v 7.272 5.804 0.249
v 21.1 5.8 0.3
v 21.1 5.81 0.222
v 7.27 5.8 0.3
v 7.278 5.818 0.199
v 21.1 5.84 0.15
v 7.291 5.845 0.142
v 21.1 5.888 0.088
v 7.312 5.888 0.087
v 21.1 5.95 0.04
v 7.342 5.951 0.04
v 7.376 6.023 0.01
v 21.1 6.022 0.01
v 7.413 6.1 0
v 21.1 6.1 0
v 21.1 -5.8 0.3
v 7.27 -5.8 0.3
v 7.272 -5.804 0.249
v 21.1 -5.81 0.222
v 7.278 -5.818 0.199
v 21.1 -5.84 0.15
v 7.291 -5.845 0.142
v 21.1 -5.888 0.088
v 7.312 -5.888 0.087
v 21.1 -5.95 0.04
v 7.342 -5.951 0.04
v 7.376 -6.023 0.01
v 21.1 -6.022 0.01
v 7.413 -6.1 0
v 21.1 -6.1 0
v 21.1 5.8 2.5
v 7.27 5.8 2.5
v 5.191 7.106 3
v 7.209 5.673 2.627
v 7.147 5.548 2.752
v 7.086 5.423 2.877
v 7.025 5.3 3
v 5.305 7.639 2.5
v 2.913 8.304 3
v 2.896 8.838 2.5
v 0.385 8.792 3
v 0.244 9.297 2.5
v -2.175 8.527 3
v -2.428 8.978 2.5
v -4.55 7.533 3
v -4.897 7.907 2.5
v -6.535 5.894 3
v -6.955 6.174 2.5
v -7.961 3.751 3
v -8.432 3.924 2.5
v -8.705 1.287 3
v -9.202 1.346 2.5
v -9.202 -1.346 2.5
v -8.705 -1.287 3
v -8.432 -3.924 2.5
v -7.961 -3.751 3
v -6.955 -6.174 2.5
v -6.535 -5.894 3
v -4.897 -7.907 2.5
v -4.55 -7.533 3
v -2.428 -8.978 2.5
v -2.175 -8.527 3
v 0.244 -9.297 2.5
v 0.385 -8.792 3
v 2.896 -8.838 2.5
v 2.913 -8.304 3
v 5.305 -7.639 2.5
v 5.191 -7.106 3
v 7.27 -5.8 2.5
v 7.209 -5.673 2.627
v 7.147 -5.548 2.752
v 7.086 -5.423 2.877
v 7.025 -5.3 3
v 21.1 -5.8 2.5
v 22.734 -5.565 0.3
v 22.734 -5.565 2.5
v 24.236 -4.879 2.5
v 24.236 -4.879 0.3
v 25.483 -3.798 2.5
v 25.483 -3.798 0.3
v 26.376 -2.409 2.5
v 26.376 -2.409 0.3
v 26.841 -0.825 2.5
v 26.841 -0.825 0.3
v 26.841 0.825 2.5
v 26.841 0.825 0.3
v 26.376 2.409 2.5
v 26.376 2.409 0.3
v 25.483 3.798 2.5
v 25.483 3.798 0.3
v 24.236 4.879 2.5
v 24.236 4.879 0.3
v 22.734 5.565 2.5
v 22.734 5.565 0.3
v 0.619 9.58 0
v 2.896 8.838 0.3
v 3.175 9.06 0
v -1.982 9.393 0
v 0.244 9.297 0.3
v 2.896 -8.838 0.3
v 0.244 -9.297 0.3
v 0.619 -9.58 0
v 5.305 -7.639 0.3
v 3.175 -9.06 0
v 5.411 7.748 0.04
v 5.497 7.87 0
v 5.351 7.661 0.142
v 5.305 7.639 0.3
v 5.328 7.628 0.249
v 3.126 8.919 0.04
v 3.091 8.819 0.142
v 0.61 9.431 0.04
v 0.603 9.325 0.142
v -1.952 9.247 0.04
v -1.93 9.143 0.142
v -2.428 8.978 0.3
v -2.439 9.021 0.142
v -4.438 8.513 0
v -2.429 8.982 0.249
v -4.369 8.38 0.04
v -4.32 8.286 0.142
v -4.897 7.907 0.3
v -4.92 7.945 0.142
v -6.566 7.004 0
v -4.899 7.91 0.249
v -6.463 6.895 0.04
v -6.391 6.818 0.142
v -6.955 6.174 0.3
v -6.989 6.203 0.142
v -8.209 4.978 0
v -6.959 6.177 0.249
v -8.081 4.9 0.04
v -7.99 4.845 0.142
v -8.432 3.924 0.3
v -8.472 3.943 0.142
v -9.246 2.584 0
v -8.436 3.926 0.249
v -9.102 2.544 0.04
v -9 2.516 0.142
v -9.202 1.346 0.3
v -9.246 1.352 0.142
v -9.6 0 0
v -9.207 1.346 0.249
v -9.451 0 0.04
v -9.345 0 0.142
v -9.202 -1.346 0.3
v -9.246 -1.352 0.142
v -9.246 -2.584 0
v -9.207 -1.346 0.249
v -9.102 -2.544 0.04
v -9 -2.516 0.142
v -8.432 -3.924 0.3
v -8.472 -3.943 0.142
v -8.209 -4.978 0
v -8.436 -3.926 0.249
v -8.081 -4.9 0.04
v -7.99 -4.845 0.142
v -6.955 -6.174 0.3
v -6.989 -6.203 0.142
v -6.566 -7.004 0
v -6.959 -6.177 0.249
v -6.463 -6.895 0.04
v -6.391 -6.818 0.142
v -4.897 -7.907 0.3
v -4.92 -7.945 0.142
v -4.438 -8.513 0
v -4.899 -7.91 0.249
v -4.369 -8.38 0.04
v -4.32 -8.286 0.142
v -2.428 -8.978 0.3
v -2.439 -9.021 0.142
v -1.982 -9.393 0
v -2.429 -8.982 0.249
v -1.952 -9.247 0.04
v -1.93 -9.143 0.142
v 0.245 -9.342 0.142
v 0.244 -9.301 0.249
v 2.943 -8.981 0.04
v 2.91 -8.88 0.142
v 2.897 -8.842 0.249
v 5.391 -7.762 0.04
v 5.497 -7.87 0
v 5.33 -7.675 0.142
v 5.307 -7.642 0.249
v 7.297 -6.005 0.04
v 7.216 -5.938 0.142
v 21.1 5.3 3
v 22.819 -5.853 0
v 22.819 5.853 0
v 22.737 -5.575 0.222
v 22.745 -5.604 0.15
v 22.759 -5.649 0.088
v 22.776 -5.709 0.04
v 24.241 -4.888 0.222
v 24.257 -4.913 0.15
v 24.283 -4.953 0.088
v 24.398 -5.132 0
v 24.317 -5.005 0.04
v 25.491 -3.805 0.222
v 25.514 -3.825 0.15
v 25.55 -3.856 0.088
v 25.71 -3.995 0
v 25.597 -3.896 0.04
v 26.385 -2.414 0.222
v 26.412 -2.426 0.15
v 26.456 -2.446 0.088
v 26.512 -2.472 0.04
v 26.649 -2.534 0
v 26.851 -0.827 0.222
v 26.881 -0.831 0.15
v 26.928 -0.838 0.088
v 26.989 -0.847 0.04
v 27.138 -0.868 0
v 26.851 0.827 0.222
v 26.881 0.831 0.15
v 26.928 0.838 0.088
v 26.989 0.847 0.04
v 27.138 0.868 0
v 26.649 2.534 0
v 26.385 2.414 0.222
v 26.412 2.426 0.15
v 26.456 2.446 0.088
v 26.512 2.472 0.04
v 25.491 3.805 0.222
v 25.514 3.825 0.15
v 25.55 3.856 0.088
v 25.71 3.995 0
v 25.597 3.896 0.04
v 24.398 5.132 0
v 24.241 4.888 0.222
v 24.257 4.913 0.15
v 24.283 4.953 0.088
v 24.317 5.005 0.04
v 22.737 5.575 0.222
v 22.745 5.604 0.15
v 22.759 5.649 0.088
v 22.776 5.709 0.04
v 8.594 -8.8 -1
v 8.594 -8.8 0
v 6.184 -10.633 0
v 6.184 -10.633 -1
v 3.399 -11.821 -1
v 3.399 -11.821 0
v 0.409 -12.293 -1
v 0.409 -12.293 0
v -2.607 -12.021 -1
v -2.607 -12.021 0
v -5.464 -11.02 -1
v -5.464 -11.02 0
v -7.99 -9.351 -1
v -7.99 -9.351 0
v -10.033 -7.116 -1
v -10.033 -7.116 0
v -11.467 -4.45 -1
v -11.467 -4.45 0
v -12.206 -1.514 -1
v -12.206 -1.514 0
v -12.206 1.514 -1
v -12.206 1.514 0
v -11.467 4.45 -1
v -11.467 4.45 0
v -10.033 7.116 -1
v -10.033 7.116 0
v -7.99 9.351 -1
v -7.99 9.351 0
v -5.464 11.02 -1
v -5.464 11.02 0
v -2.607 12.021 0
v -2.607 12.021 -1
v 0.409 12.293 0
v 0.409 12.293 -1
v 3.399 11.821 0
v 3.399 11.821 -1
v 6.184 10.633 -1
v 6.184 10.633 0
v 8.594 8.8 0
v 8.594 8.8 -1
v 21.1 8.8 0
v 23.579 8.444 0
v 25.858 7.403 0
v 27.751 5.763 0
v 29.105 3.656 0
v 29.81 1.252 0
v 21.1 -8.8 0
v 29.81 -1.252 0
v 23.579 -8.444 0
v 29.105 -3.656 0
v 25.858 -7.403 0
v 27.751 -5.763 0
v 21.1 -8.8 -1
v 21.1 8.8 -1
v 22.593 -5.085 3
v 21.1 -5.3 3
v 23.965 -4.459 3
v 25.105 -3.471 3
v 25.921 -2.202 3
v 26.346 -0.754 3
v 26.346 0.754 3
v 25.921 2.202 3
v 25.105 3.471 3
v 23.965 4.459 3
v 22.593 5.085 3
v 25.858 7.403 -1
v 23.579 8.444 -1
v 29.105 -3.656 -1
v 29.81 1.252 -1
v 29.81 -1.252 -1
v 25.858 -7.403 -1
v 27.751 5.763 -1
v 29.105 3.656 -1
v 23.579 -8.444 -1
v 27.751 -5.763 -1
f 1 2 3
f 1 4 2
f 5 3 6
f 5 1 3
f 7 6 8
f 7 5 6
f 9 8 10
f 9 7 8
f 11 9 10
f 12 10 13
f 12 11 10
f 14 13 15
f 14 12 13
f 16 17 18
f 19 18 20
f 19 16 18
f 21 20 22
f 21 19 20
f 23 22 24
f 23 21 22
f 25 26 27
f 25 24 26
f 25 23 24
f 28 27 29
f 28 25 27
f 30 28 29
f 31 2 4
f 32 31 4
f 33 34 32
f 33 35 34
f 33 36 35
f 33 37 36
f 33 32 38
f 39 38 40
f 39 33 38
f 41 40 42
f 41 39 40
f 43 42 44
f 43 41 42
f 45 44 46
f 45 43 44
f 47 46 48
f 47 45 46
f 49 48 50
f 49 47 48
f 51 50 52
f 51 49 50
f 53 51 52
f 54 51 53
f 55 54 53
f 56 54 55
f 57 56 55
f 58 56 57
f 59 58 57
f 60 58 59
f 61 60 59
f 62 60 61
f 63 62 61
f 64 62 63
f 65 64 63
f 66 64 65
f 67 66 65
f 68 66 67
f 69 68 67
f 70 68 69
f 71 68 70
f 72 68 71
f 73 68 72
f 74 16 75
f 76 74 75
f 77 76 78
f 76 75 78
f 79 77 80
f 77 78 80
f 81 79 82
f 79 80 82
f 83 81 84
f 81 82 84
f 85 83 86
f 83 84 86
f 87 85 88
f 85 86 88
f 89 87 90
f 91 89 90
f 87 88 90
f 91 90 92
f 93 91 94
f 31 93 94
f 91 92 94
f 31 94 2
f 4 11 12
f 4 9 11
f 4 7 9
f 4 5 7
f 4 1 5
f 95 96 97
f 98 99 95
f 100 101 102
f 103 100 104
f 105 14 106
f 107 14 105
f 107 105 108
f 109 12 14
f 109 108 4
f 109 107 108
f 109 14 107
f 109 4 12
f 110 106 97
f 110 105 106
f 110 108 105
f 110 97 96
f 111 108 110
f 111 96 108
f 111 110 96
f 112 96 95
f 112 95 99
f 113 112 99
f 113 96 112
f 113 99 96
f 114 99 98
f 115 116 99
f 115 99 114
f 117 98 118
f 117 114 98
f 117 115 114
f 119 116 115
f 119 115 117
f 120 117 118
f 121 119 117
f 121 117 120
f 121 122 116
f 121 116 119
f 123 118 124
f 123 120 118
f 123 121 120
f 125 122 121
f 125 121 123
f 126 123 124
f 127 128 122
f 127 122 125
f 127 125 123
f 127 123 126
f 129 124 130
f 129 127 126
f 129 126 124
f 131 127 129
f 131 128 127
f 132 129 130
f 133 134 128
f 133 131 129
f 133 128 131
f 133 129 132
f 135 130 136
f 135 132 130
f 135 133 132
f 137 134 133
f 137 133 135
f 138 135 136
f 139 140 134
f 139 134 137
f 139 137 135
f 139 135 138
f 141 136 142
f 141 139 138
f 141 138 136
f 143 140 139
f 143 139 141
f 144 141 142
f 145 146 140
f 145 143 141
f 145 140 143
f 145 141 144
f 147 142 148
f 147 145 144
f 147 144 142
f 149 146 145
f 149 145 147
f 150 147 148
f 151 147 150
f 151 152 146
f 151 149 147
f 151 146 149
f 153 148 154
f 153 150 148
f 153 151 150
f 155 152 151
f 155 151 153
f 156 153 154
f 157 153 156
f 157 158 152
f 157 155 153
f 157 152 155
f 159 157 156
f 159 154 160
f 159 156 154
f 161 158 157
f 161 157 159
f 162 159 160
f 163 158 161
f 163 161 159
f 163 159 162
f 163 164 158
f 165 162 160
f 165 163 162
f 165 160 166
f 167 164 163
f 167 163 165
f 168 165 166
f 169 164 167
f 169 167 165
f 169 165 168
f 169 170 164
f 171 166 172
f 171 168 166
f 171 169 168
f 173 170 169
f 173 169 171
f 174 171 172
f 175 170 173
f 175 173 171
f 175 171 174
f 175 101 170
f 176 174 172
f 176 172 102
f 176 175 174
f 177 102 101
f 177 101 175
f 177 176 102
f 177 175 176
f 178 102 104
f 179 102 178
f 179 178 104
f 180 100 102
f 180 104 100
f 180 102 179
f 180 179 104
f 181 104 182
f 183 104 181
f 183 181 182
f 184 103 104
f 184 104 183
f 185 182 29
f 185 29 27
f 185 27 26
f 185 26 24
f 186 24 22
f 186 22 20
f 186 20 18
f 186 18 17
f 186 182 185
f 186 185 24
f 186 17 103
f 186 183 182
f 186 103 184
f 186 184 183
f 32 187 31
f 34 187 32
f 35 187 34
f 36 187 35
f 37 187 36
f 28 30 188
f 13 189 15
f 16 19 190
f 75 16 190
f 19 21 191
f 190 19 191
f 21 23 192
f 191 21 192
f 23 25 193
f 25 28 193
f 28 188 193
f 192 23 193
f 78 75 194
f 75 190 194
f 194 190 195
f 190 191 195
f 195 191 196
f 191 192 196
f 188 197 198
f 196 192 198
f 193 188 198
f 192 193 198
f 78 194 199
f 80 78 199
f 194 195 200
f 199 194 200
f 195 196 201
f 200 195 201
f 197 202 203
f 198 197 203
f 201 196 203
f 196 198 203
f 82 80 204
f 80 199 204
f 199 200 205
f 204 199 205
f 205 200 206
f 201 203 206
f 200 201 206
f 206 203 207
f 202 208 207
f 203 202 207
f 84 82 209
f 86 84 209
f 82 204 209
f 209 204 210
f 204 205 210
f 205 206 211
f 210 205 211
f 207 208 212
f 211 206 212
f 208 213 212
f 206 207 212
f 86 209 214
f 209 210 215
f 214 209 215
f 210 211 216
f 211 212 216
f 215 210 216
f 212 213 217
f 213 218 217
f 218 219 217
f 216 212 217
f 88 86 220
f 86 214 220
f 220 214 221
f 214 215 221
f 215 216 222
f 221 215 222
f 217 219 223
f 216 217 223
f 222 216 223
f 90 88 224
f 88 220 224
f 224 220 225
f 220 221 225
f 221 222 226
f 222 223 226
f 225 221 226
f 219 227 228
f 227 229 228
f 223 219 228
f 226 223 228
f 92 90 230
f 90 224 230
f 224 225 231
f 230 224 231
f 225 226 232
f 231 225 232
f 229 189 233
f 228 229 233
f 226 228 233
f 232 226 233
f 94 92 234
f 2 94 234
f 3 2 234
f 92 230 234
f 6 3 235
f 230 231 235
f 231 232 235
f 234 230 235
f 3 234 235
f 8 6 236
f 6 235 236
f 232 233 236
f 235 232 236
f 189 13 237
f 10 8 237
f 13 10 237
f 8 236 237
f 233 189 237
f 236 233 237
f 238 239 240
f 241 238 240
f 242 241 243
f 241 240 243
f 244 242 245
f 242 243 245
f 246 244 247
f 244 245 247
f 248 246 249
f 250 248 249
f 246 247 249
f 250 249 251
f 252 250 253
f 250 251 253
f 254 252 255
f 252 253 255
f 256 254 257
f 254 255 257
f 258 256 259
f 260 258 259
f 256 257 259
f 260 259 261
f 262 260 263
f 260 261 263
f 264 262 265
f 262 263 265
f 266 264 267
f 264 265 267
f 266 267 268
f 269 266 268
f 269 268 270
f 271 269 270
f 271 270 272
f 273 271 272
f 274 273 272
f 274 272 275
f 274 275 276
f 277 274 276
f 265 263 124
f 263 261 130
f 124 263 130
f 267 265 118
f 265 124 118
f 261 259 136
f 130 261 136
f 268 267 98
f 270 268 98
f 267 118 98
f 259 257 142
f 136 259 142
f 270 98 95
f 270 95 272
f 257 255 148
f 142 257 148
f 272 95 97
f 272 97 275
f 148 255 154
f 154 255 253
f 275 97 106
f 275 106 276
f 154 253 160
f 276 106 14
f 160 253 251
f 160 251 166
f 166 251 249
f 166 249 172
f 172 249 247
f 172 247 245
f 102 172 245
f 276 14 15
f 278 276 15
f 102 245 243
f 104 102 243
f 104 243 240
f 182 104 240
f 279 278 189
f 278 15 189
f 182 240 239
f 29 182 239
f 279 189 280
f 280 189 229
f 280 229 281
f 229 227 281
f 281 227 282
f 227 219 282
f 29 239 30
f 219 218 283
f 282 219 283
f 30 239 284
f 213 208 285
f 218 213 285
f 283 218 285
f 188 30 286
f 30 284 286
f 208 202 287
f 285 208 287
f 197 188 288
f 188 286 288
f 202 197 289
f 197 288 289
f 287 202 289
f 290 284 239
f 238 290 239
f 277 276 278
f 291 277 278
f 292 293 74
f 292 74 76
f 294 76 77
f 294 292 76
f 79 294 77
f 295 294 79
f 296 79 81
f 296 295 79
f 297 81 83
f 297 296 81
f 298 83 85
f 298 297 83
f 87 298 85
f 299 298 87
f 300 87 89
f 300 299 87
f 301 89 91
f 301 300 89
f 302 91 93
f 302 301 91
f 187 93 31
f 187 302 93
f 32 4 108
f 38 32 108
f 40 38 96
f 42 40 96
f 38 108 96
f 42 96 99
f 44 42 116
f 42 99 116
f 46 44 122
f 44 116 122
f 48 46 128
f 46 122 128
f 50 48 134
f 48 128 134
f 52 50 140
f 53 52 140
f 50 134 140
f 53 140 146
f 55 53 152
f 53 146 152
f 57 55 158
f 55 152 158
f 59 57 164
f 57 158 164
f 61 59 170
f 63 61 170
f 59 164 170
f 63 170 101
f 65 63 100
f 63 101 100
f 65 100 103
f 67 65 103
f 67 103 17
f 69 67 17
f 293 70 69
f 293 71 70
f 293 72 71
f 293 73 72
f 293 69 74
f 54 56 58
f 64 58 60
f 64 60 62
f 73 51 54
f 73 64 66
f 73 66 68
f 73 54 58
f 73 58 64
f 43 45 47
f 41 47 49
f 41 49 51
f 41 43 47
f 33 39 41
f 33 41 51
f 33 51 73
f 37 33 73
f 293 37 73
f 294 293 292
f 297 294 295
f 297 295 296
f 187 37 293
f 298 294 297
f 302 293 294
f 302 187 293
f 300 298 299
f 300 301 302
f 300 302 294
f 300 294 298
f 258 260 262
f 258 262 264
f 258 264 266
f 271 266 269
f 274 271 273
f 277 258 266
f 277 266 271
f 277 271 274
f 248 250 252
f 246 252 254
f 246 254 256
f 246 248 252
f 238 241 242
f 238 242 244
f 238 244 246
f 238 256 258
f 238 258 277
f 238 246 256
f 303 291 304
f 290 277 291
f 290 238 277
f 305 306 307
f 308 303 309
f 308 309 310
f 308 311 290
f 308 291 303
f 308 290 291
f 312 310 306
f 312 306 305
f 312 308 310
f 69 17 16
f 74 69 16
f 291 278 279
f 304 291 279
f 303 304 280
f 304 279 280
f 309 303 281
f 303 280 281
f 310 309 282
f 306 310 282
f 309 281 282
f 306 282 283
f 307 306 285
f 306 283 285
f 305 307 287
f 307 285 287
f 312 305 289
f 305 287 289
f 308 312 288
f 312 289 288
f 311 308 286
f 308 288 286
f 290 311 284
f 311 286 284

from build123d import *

# Parameters (mm, degrees)
F1_DEPTH = 3
F3_DEPTH = 1
F4_SIZE  = 0.5
F5_R     = 0.3


with BuildPart() as f1:
    # F0 (on Top) → F1 (new body)
    with BuildSketch(Plane.XY):
        with BuildLine():
            Line((21.1, 5.8), (7.2698005475, 5.8))
            ThreePointArc((7.2698005475, 5.8), (-9.3, 0), (7.2698005475, -5.8))
            Line((7.2698005475, -5.8), (21.1, -5.8))
            ThreePointArc((21.1, -5.8), (26.9, 0), (21.1, 5.8))
        make_face()
    extrude(amount=F1_DEPTH)

    # F2 (on face) → F3 (join)
    with BuildSketch(Plane(origin=(0, 0, 0), x_dir=(1, 0, 0), z_dir=(0, 0, -1))):
        with BuildLine():
            ThreePointArc((21.1, -8.8), (29.9, 0), (21.1, 8.8))
            Line((21.1, 8.8), (8.5936022715, 8.8))
            ThreePointArc((8.5936022715, 8.8), (-12.3, 0), (8.5936022715, -8.8))
            Line((8.5936022715, -8.8), (21.1, -8.8))
        make_face()
    extrude(amount=F3_DEPTH)

    # F4
    f4_edges = [f1.edges().sort_by_distance(p)[0] for p in [
        (14.1849, -5.8, 3),
        (26.9, 0, 3),
        (14.1849, 5.8, 3),
        (-9.3, 0, 3),
    ]]
    chamfer(f4_edges, length=F4_SIZE)

    # F5
    f5_edges = [f1.edges().sort_by_distance(p)[0] for p in [
        (-9.3, 0, 0),
        (14.1849, -5.8, 0),
        (26.9, 0, 0),
        (14.1849, 5.8, 0),
    ]]
    fillet(f5_edges, radius=F5_R)


solid = f1.part
